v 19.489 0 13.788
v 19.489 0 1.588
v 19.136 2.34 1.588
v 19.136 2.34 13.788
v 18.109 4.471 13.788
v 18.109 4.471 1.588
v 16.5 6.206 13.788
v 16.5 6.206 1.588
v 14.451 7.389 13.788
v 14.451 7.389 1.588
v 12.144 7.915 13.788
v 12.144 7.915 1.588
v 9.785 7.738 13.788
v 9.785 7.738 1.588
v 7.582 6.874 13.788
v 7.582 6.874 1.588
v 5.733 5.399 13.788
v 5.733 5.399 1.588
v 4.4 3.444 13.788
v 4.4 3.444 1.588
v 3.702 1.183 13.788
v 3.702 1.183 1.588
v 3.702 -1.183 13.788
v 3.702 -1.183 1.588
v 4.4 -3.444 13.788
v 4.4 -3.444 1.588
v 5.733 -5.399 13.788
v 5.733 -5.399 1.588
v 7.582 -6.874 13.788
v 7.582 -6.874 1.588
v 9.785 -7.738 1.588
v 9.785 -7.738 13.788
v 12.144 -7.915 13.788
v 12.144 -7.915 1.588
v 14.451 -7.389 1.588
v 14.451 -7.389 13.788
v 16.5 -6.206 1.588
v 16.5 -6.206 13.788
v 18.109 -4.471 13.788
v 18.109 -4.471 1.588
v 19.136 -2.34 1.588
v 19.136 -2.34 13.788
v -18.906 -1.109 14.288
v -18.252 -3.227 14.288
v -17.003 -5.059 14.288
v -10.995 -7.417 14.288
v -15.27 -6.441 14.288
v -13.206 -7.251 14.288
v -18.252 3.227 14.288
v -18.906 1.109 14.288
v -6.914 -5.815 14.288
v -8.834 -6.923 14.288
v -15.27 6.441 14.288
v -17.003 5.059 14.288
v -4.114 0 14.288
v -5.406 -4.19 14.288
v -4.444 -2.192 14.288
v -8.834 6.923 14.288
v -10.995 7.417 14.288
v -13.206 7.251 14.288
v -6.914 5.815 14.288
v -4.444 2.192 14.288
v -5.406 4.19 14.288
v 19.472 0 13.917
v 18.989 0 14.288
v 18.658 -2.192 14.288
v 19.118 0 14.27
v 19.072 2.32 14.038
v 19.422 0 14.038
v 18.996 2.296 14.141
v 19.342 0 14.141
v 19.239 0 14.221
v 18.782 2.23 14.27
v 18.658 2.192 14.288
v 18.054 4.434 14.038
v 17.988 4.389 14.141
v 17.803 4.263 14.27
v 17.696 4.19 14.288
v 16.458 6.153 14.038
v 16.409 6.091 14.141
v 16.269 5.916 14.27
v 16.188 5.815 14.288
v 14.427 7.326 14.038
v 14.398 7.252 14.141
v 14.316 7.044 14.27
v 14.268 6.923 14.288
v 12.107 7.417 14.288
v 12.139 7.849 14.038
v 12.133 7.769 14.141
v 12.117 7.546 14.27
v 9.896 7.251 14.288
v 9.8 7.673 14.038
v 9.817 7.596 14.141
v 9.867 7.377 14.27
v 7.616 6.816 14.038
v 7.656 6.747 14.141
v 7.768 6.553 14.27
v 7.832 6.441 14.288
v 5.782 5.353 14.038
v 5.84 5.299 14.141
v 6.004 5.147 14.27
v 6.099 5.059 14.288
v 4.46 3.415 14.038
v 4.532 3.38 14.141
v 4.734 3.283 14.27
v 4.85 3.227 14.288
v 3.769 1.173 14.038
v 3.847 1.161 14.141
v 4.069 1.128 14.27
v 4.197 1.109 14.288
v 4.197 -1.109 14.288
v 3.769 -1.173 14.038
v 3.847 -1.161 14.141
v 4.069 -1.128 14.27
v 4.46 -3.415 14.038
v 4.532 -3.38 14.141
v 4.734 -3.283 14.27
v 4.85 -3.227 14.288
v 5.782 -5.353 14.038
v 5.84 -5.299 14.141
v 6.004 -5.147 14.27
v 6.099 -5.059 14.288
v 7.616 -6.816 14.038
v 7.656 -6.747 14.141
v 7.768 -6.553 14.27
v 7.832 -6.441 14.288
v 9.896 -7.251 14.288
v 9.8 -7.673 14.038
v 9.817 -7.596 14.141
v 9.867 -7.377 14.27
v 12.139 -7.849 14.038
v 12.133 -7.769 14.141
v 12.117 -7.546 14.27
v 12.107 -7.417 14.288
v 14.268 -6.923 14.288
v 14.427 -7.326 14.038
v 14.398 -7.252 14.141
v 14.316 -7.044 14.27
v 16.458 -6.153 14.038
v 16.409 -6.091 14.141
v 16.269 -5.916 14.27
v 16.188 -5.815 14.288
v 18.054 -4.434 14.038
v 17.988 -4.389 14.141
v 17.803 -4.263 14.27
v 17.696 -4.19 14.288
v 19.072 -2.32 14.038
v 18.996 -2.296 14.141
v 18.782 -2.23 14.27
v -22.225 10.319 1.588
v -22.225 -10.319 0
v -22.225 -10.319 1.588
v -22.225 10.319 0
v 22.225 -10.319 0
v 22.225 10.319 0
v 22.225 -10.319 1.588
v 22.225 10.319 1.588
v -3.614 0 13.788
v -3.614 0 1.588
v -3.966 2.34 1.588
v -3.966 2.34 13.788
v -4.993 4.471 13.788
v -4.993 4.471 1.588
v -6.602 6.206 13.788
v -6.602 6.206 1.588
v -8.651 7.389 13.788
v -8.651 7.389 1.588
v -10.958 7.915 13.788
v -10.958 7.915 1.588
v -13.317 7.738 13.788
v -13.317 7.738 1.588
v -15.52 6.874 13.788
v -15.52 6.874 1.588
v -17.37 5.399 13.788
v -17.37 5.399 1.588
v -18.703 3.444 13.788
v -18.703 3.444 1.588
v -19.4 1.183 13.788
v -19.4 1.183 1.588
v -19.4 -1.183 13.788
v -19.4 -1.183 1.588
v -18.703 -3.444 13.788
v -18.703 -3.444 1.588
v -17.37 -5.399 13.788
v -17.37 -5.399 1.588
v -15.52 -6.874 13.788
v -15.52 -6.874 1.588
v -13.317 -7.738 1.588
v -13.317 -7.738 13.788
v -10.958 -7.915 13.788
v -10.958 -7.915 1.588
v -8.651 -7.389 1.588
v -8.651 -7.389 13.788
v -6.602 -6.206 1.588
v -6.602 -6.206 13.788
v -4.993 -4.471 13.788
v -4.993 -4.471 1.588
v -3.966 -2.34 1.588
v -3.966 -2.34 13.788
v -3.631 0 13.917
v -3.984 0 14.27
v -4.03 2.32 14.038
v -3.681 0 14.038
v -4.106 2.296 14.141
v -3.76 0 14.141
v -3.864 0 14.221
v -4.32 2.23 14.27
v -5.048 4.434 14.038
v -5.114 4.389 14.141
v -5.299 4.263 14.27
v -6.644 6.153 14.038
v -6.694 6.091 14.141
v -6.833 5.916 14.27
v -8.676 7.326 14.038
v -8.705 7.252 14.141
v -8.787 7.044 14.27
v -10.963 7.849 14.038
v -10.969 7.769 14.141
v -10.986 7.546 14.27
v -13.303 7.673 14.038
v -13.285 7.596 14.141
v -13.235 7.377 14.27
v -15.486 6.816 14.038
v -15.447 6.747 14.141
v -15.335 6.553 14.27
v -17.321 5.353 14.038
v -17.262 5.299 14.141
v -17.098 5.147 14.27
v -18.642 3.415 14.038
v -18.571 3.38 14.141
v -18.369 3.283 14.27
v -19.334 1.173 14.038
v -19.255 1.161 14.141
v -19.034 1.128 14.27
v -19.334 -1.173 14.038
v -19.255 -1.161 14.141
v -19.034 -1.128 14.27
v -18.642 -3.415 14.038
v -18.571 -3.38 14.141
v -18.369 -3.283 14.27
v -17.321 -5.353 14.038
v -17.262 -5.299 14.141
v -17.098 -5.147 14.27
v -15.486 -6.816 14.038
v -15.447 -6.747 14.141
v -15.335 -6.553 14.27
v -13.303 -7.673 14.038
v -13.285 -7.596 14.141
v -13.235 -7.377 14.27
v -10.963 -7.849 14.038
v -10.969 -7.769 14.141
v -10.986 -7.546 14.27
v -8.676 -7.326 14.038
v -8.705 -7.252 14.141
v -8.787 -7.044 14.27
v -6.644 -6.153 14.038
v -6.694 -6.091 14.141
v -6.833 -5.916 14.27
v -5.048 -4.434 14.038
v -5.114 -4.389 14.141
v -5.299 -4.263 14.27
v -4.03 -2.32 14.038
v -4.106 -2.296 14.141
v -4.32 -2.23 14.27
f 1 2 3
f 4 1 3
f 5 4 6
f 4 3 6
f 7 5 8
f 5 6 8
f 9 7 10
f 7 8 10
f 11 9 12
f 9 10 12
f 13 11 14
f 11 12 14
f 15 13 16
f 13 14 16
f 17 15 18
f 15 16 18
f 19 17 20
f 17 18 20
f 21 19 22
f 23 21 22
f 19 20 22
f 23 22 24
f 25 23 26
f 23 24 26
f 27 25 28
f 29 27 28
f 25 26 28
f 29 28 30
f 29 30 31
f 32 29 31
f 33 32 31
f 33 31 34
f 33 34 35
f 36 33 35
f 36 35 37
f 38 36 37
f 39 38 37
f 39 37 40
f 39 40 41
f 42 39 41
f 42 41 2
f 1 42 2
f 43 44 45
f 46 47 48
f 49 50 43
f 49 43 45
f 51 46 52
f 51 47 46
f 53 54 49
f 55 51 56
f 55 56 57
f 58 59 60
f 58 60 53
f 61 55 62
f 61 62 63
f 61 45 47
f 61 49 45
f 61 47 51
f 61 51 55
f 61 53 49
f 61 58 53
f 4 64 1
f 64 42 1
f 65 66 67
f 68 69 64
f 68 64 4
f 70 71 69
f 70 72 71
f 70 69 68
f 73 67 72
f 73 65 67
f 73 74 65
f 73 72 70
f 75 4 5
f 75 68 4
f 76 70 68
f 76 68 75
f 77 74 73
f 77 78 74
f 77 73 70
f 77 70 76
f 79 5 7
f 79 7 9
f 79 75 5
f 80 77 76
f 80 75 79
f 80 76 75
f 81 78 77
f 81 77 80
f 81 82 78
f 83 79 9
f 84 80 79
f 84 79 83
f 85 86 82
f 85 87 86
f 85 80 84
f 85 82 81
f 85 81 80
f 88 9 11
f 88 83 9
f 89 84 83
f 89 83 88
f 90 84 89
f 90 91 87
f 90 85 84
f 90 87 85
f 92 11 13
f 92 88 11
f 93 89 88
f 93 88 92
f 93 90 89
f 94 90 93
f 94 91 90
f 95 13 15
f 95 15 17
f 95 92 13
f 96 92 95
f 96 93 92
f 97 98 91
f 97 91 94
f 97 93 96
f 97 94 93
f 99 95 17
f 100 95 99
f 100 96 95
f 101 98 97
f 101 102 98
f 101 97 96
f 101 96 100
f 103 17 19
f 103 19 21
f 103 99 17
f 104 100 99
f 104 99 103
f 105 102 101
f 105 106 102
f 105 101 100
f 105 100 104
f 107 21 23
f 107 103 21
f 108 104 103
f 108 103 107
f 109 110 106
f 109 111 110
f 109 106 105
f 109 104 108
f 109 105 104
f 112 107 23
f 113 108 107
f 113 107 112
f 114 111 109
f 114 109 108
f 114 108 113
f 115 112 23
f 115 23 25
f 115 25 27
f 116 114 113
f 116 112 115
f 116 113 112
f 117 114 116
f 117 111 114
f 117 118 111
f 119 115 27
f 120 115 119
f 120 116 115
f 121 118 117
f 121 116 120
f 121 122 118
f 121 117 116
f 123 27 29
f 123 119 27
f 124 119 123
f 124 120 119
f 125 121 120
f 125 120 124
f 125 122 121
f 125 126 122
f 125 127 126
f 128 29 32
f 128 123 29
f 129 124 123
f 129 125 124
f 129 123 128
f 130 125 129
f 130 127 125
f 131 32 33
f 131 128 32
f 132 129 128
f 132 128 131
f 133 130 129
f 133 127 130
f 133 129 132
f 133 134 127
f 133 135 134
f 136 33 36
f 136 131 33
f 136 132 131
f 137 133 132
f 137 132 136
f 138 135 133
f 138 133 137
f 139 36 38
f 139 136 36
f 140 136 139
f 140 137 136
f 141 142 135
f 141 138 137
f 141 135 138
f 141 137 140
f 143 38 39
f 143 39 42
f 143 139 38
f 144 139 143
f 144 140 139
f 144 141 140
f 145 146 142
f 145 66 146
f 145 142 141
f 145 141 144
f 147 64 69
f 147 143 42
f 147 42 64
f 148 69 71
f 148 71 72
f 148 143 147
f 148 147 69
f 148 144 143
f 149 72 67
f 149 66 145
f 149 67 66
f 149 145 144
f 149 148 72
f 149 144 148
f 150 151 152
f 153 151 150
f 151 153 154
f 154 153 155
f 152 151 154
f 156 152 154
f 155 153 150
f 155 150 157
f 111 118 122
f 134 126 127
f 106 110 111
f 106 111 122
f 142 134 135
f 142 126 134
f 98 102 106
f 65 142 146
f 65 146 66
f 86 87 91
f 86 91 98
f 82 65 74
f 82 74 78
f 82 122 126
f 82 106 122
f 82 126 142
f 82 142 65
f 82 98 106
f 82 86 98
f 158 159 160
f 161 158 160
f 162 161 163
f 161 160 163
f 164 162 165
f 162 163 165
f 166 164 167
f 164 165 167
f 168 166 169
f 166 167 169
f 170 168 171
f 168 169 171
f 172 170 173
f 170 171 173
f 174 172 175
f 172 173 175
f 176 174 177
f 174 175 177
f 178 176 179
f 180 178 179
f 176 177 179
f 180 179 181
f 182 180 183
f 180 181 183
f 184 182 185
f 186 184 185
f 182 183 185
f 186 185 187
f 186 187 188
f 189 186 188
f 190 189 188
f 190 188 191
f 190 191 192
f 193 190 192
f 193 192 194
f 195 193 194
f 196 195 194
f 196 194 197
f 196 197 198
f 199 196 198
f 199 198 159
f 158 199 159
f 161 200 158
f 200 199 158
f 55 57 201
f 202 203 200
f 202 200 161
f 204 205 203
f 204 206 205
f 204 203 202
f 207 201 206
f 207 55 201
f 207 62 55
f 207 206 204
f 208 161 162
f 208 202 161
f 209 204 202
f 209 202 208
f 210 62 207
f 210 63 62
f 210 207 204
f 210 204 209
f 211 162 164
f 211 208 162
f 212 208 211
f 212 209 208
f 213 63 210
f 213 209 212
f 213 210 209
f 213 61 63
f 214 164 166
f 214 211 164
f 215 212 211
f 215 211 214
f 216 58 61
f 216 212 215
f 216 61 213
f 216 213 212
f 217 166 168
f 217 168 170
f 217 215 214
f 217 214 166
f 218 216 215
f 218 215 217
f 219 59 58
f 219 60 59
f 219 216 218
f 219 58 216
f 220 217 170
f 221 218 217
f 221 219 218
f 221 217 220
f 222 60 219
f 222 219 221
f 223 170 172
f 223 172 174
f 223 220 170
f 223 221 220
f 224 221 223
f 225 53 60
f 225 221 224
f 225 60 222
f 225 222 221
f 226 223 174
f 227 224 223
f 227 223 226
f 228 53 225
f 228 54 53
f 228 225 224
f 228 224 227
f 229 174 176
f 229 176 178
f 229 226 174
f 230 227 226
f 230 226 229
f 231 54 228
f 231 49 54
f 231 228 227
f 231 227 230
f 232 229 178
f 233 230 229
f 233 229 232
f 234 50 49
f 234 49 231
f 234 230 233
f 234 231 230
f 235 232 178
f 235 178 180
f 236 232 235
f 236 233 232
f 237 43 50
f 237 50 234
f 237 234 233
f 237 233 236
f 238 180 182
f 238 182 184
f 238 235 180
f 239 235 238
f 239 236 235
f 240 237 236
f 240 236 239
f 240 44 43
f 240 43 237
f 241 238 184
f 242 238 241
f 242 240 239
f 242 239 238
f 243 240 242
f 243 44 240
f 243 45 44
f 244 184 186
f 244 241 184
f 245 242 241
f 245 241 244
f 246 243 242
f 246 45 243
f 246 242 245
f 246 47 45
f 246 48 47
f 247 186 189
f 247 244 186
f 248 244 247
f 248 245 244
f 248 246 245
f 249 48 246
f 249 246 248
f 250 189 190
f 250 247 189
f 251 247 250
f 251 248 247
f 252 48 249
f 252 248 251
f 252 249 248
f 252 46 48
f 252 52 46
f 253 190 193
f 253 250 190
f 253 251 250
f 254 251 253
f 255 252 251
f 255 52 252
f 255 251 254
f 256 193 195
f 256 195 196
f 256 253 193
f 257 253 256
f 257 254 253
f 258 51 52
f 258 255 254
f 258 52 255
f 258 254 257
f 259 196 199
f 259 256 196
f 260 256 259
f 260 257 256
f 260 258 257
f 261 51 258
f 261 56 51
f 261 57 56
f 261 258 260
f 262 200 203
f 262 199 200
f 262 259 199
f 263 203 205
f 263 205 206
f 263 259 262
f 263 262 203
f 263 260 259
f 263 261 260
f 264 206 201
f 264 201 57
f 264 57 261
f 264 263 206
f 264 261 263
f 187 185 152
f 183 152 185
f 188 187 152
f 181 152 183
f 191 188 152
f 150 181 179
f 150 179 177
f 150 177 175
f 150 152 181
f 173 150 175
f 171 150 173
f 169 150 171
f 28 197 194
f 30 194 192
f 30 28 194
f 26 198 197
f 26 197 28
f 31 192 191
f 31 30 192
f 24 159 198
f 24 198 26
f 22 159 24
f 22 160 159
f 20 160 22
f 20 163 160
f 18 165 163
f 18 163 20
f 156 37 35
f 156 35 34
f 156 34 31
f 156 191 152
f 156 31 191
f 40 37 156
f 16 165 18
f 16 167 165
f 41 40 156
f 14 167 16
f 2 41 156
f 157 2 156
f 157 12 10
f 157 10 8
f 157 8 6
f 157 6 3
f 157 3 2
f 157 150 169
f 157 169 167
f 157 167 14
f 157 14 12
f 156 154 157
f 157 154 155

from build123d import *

# Parameters (mm, degrees)
F0_W     = 44.45
F0_H     = 20.6375
F0_R     = 7.9375
F1_DEPTH = 1.5875
F2_DEPTH = 14.2875
F3_R     = 0.5


with BuildPart() as f1:
    # F0 (on Top) → F1 (new body)
    with BuildSketch(Plane.XY):
        Rectangle(F0_W, F0_H)
        with Locations((-11.551156, 0)):
            Circle(F0_R, mode=Mode.SUBTRACT)
        with Locations((11.551156, 0)):
            Circle(F0_R, mode=Mode.SUBTRACT)
        with Locations((-11.551156, 0)):
            Circle(F0_R)
        with Locations((11.551156, 0)):
            Circle(F0_R)
    extrude(amount=F1_DEPTH)

    # F0 (on Top) → F2 (join)
    with BuildSketch(Plane.XY):
        with Locations((-11.551156, 0)):
            Circle(F0_R)
        with Locations((11.551156, 0)):
            Circle(F0_R)
    extrude(amount=F2_DEPTH)

    # F3
    f3_edges = [f1.edges().sort_by_distance(p)[0] for p in [
        (-19.488656, 0, 14.2875),
        (3.613656, 0, 14.2875),
    ]]
    fillet(f3_edges, radius=F3_R)


solid = f1.part
